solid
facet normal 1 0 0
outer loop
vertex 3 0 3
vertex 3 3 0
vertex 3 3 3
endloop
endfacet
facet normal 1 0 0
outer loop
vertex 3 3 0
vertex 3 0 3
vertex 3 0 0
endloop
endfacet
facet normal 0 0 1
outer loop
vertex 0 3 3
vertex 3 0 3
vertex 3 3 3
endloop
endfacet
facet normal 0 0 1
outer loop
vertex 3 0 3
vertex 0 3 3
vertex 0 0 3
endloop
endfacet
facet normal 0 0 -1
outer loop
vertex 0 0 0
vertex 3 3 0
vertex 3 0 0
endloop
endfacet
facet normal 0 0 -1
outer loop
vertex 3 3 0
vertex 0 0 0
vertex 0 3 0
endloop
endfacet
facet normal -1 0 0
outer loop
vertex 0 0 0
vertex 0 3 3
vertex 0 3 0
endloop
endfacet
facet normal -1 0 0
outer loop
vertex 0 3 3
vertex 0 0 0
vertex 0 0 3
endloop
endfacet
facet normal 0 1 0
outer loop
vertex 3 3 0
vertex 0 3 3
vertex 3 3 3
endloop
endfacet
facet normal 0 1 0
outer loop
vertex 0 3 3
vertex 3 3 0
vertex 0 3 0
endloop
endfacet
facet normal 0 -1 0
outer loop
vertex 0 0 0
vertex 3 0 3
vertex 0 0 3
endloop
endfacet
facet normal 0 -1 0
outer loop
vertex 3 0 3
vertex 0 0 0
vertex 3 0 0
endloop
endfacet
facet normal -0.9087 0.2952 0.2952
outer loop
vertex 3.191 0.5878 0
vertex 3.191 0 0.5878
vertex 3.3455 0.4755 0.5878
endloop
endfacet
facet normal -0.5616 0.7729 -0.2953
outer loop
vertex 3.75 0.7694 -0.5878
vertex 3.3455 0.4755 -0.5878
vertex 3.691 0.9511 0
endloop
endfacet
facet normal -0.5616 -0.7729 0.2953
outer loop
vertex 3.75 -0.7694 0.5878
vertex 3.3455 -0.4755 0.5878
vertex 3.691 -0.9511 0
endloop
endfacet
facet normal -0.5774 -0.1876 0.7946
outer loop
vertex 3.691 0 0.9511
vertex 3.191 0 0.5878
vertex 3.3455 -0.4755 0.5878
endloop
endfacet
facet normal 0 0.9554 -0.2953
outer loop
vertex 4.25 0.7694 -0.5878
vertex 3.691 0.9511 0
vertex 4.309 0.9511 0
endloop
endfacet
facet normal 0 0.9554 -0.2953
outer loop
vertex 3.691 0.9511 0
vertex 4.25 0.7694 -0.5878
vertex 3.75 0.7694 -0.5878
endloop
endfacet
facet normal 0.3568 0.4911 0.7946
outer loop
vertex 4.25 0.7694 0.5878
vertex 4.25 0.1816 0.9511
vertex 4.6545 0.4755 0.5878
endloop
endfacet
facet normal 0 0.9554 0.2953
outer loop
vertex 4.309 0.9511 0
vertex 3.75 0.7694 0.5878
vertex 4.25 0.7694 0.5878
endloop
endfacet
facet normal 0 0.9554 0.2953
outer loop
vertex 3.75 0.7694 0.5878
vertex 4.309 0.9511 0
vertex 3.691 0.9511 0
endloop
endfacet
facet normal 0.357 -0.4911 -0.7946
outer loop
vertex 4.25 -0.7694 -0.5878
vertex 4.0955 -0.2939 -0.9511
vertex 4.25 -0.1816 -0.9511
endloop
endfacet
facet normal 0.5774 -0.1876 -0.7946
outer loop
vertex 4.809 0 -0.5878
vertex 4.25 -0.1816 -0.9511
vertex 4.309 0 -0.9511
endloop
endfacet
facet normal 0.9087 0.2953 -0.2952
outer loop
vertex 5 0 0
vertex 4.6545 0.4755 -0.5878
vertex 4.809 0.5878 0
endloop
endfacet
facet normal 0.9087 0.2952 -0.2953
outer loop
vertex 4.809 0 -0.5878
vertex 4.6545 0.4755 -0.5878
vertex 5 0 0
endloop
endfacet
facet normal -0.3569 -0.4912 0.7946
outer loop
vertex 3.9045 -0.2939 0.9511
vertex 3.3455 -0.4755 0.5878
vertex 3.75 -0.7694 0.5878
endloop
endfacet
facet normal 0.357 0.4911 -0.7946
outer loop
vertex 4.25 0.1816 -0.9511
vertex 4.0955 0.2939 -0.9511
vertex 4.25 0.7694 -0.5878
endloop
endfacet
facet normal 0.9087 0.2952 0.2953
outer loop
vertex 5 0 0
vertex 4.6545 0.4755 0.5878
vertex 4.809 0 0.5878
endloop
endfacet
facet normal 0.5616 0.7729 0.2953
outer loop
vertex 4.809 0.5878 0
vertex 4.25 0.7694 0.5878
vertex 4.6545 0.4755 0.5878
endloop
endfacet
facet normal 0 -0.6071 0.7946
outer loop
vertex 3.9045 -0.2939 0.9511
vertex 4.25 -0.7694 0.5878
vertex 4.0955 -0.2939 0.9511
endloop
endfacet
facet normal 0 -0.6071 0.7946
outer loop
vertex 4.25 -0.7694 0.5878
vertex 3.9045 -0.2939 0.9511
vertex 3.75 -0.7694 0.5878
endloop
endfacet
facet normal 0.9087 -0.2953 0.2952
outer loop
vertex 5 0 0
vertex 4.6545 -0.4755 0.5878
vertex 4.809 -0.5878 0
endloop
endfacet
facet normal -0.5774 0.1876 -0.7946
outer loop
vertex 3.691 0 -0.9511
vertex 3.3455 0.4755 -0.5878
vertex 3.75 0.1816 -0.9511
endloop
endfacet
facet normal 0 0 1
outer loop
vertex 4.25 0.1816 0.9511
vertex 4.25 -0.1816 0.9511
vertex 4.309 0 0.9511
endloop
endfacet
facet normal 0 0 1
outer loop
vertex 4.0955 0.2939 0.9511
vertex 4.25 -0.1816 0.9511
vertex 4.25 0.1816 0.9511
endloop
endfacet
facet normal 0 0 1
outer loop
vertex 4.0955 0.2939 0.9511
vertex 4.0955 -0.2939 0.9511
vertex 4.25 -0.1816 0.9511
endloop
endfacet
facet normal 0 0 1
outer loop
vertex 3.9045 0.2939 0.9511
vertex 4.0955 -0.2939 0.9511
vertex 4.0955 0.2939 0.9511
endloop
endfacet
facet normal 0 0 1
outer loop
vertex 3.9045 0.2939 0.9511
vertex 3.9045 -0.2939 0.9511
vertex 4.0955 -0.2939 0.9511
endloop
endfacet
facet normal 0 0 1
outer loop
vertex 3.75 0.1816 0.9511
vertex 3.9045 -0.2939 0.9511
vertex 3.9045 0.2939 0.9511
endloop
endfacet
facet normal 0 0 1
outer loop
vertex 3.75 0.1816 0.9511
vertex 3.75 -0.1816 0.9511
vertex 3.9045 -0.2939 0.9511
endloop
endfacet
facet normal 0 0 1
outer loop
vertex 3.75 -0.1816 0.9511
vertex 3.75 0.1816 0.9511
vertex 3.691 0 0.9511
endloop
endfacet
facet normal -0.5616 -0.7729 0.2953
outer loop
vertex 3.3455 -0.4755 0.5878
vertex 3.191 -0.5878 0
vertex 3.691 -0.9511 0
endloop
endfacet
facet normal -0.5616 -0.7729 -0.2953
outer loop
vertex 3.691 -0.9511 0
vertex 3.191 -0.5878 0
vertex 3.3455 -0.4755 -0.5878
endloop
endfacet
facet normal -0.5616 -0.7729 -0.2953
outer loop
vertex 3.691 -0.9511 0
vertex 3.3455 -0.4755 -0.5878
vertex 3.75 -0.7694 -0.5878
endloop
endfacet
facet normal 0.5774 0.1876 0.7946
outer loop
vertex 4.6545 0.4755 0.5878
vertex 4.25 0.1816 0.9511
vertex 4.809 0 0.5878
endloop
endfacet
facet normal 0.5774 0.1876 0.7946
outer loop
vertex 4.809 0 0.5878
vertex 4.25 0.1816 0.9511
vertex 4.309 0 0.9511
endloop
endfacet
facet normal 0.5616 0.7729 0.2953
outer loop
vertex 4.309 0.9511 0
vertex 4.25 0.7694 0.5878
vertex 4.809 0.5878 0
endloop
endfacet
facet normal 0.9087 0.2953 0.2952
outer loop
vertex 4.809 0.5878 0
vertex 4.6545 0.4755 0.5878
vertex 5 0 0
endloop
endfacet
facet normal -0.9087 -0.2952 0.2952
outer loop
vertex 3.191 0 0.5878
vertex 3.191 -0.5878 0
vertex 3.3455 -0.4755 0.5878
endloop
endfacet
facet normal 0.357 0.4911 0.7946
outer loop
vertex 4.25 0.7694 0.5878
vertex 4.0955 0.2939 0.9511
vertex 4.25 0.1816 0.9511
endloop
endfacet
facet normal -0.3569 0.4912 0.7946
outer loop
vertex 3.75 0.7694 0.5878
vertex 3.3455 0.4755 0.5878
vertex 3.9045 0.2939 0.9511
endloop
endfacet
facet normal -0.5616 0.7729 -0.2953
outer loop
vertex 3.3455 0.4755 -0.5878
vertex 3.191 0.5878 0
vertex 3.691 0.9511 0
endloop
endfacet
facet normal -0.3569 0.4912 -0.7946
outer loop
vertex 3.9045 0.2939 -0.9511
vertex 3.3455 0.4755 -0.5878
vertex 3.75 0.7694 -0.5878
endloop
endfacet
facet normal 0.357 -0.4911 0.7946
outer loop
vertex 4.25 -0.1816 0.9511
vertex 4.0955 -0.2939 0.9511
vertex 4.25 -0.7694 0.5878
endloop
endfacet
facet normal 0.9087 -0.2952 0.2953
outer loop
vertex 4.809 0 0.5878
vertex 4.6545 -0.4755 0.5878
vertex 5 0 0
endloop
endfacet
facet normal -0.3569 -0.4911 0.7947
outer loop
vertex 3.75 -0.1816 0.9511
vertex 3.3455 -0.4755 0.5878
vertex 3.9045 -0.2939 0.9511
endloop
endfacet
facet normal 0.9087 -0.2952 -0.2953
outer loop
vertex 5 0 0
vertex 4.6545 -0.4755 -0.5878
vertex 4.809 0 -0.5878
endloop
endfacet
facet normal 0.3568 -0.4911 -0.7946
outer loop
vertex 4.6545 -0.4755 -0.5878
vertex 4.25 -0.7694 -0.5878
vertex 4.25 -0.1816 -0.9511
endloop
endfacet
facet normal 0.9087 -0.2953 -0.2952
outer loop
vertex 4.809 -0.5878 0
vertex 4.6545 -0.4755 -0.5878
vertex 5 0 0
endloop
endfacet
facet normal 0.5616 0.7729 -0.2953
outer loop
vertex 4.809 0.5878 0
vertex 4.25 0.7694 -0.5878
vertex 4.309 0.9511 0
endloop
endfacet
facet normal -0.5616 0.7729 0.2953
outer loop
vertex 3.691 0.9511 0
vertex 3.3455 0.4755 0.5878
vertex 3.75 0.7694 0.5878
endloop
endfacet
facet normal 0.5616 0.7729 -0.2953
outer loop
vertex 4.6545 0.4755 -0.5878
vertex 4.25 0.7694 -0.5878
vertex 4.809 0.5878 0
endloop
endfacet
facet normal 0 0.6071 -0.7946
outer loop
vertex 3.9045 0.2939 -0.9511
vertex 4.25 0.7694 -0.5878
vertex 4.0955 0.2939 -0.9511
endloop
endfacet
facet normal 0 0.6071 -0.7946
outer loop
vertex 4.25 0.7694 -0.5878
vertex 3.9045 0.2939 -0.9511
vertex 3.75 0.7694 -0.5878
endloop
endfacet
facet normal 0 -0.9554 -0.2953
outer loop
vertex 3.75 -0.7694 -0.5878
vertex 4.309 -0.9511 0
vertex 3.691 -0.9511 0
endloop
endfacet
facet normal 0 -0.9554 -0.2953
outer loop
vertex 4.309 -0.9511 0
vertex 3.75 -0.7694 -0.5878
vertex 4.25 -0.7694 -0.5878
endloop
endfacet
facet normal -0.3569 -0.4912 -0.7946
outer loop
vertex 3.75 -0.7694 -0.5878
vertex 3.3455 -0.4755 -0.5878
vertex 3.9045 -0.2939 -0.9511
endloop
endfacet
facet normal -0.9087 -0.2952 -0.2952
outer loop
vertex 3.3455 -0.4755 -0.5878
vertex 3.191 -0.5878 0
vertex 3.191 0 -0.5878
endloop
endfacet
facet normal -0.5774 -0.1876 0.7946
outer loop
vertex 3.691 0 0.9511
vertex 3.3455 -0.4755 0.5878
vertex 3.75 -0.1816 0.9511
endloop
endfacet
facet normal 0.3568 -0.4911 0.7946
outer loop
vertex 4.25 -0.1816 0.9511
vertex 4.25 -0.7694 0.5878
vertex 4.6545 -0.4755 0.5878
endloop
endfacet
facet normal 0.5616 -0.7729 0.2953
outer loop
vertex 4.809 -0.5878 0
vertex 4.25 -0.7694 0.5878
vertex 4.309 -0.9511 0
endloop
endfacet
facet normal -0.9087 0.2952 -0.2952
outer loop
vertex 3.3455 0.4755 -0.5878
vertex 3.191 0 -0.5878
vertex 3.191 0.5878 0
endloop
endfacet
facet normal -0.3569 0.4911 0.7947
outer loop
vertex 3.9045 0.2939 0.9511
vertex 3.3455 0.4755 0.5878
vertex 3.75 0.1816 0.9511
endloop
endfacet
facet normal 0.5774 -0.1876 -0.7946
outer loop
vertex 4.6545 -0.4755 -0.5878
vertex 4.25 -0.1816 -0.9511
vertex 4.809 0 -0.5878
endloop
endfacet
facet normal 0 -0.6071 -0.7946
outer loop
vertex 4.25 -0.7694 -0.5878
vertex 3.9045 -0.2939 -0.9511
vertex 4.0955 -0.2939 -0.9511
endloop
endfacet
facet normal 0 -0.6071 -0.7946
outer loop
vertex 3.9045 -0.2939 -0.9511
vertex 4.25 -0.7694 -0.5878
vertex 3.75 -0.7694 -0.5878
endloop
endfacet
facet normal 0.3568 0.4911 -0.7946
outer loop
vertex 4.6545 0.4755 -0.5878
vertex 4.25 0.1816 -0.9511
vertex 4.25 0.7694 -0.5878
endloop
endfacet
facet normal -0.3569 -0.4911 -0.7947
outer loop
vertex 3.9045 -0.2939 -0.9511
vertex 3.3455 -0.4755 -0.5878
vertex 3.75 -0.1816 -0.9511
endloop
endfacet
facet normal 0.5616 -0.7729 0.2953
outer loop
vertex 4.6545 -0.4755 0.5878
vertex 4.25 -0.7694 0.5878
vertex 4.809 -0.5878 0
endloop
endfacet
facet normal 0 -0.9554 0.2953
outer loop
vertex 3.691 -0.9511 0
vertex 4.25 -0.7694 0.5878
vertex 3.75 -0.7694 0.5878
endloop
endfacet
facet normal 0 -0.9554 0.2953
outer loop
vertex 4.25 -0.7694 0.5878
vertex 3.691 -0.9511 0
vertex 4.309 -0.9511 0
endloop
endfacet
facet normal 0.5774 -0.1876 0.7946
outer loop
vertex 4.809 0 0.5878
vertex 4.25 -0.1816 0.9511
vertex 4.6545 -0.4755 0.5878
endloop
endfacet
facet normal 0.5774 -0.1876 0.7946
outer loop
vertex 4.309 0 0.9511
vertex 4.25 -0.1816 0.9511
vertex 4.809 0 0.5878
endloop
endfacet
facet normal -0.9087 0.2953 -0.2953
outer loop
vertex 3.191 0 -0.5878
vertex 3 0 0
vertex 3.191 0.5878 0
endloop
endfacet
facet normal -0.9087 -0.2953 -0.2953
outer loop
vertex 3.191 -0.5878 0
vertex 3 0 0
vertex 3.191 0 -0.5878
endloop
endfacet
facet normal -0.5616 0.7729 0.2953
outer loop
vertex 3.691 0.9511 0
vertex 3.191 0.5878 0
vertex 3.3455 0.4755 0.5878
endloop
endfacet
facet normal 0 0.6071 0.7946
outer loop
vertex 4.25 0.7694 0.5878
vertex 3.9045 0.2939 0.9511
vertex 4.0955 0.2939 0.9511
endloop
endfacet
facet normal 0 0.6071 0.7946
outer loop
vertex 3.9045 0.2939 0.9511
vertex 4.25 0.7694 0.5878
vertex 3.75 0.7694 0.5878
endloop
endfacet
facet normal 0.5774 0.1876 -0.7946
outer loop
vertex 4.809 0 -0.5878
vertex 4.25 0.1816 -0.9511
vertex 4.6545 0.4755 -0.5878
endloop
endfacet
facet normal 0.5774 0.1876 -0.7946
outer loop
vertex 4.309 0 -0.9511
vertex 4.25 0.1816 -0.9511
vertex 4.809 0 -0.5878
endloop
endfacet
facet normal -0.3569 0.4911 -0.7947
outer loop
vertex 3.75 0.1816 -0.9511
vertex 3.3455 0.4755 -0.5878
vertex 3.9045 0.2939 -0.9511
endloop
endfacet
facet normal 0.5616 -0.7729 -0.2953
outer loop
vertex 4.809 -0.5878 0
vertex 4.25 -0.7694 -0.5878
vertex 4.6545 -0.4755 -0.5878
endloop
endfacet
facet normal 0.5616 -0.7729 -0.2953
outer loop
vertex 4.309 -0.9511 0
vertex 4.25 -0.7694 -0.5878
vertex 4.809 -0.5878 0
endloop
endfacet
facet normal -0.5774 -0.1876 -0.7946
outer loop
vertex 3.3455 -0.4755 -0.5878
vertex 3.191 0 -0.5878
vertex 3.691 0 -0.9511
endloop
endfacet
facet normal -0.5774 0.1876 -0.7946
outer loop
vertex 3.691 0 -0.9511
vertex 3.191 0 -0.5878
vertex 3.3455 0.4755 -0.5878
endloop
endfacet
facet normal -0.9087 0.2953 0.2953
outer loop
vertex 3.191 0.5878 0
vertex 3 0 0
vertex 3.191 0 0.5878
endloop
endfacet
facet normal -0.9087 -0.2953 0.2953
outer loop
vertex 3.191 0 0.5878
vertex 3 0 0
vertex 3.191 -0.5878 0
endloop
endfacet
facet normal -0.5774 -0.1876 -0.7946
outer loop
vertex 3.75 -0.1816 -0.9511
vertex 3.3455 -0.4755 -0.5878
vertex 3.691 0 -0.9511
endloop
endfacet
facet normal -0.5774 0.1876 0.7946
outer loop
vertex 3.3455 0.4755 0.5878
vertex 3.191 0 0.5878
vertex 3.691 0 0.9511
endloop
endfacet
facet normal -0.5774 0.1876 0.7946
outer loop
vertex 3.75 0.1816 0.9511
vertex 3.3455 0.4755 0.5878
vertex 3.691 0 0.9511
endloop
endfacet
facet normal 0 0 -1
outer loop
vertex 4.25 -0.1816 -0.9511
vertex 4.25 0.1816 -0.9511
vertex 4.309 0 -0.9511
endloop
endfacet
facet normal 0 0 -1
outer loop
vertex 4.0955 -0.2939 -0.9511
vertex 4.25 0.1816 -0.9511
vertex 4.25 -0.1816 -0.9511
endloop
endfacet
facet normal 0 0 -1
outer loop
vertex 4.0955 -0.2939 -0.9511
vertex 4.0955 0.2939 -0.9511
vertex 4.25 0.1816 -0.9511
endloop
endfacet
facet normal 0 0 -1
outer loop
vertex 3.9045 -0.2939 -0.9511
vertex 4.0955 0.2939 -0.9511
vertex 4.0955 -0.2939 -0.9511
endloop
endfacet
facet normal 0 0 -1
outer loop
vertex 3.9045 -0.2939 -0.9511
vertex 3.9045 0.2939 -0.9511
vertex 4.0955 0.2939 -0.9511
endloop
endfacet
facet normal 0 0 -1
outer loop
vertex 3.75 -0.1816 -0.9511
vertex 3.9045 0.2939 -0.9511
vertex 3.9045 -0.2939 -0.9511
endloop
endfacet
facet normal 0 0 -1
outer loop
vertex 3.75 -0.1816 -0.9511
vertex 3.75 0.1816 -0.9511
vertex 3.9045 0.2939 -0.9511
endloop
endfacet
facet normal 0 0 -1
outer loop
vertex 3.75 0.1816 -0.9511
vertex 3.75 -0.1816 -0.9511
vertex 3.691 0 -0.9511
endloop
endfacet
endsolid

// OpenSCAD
// # keeps the object in the result
#cube(3);
translate([4, 0, 0]) sphere(1, $fn = 10);
